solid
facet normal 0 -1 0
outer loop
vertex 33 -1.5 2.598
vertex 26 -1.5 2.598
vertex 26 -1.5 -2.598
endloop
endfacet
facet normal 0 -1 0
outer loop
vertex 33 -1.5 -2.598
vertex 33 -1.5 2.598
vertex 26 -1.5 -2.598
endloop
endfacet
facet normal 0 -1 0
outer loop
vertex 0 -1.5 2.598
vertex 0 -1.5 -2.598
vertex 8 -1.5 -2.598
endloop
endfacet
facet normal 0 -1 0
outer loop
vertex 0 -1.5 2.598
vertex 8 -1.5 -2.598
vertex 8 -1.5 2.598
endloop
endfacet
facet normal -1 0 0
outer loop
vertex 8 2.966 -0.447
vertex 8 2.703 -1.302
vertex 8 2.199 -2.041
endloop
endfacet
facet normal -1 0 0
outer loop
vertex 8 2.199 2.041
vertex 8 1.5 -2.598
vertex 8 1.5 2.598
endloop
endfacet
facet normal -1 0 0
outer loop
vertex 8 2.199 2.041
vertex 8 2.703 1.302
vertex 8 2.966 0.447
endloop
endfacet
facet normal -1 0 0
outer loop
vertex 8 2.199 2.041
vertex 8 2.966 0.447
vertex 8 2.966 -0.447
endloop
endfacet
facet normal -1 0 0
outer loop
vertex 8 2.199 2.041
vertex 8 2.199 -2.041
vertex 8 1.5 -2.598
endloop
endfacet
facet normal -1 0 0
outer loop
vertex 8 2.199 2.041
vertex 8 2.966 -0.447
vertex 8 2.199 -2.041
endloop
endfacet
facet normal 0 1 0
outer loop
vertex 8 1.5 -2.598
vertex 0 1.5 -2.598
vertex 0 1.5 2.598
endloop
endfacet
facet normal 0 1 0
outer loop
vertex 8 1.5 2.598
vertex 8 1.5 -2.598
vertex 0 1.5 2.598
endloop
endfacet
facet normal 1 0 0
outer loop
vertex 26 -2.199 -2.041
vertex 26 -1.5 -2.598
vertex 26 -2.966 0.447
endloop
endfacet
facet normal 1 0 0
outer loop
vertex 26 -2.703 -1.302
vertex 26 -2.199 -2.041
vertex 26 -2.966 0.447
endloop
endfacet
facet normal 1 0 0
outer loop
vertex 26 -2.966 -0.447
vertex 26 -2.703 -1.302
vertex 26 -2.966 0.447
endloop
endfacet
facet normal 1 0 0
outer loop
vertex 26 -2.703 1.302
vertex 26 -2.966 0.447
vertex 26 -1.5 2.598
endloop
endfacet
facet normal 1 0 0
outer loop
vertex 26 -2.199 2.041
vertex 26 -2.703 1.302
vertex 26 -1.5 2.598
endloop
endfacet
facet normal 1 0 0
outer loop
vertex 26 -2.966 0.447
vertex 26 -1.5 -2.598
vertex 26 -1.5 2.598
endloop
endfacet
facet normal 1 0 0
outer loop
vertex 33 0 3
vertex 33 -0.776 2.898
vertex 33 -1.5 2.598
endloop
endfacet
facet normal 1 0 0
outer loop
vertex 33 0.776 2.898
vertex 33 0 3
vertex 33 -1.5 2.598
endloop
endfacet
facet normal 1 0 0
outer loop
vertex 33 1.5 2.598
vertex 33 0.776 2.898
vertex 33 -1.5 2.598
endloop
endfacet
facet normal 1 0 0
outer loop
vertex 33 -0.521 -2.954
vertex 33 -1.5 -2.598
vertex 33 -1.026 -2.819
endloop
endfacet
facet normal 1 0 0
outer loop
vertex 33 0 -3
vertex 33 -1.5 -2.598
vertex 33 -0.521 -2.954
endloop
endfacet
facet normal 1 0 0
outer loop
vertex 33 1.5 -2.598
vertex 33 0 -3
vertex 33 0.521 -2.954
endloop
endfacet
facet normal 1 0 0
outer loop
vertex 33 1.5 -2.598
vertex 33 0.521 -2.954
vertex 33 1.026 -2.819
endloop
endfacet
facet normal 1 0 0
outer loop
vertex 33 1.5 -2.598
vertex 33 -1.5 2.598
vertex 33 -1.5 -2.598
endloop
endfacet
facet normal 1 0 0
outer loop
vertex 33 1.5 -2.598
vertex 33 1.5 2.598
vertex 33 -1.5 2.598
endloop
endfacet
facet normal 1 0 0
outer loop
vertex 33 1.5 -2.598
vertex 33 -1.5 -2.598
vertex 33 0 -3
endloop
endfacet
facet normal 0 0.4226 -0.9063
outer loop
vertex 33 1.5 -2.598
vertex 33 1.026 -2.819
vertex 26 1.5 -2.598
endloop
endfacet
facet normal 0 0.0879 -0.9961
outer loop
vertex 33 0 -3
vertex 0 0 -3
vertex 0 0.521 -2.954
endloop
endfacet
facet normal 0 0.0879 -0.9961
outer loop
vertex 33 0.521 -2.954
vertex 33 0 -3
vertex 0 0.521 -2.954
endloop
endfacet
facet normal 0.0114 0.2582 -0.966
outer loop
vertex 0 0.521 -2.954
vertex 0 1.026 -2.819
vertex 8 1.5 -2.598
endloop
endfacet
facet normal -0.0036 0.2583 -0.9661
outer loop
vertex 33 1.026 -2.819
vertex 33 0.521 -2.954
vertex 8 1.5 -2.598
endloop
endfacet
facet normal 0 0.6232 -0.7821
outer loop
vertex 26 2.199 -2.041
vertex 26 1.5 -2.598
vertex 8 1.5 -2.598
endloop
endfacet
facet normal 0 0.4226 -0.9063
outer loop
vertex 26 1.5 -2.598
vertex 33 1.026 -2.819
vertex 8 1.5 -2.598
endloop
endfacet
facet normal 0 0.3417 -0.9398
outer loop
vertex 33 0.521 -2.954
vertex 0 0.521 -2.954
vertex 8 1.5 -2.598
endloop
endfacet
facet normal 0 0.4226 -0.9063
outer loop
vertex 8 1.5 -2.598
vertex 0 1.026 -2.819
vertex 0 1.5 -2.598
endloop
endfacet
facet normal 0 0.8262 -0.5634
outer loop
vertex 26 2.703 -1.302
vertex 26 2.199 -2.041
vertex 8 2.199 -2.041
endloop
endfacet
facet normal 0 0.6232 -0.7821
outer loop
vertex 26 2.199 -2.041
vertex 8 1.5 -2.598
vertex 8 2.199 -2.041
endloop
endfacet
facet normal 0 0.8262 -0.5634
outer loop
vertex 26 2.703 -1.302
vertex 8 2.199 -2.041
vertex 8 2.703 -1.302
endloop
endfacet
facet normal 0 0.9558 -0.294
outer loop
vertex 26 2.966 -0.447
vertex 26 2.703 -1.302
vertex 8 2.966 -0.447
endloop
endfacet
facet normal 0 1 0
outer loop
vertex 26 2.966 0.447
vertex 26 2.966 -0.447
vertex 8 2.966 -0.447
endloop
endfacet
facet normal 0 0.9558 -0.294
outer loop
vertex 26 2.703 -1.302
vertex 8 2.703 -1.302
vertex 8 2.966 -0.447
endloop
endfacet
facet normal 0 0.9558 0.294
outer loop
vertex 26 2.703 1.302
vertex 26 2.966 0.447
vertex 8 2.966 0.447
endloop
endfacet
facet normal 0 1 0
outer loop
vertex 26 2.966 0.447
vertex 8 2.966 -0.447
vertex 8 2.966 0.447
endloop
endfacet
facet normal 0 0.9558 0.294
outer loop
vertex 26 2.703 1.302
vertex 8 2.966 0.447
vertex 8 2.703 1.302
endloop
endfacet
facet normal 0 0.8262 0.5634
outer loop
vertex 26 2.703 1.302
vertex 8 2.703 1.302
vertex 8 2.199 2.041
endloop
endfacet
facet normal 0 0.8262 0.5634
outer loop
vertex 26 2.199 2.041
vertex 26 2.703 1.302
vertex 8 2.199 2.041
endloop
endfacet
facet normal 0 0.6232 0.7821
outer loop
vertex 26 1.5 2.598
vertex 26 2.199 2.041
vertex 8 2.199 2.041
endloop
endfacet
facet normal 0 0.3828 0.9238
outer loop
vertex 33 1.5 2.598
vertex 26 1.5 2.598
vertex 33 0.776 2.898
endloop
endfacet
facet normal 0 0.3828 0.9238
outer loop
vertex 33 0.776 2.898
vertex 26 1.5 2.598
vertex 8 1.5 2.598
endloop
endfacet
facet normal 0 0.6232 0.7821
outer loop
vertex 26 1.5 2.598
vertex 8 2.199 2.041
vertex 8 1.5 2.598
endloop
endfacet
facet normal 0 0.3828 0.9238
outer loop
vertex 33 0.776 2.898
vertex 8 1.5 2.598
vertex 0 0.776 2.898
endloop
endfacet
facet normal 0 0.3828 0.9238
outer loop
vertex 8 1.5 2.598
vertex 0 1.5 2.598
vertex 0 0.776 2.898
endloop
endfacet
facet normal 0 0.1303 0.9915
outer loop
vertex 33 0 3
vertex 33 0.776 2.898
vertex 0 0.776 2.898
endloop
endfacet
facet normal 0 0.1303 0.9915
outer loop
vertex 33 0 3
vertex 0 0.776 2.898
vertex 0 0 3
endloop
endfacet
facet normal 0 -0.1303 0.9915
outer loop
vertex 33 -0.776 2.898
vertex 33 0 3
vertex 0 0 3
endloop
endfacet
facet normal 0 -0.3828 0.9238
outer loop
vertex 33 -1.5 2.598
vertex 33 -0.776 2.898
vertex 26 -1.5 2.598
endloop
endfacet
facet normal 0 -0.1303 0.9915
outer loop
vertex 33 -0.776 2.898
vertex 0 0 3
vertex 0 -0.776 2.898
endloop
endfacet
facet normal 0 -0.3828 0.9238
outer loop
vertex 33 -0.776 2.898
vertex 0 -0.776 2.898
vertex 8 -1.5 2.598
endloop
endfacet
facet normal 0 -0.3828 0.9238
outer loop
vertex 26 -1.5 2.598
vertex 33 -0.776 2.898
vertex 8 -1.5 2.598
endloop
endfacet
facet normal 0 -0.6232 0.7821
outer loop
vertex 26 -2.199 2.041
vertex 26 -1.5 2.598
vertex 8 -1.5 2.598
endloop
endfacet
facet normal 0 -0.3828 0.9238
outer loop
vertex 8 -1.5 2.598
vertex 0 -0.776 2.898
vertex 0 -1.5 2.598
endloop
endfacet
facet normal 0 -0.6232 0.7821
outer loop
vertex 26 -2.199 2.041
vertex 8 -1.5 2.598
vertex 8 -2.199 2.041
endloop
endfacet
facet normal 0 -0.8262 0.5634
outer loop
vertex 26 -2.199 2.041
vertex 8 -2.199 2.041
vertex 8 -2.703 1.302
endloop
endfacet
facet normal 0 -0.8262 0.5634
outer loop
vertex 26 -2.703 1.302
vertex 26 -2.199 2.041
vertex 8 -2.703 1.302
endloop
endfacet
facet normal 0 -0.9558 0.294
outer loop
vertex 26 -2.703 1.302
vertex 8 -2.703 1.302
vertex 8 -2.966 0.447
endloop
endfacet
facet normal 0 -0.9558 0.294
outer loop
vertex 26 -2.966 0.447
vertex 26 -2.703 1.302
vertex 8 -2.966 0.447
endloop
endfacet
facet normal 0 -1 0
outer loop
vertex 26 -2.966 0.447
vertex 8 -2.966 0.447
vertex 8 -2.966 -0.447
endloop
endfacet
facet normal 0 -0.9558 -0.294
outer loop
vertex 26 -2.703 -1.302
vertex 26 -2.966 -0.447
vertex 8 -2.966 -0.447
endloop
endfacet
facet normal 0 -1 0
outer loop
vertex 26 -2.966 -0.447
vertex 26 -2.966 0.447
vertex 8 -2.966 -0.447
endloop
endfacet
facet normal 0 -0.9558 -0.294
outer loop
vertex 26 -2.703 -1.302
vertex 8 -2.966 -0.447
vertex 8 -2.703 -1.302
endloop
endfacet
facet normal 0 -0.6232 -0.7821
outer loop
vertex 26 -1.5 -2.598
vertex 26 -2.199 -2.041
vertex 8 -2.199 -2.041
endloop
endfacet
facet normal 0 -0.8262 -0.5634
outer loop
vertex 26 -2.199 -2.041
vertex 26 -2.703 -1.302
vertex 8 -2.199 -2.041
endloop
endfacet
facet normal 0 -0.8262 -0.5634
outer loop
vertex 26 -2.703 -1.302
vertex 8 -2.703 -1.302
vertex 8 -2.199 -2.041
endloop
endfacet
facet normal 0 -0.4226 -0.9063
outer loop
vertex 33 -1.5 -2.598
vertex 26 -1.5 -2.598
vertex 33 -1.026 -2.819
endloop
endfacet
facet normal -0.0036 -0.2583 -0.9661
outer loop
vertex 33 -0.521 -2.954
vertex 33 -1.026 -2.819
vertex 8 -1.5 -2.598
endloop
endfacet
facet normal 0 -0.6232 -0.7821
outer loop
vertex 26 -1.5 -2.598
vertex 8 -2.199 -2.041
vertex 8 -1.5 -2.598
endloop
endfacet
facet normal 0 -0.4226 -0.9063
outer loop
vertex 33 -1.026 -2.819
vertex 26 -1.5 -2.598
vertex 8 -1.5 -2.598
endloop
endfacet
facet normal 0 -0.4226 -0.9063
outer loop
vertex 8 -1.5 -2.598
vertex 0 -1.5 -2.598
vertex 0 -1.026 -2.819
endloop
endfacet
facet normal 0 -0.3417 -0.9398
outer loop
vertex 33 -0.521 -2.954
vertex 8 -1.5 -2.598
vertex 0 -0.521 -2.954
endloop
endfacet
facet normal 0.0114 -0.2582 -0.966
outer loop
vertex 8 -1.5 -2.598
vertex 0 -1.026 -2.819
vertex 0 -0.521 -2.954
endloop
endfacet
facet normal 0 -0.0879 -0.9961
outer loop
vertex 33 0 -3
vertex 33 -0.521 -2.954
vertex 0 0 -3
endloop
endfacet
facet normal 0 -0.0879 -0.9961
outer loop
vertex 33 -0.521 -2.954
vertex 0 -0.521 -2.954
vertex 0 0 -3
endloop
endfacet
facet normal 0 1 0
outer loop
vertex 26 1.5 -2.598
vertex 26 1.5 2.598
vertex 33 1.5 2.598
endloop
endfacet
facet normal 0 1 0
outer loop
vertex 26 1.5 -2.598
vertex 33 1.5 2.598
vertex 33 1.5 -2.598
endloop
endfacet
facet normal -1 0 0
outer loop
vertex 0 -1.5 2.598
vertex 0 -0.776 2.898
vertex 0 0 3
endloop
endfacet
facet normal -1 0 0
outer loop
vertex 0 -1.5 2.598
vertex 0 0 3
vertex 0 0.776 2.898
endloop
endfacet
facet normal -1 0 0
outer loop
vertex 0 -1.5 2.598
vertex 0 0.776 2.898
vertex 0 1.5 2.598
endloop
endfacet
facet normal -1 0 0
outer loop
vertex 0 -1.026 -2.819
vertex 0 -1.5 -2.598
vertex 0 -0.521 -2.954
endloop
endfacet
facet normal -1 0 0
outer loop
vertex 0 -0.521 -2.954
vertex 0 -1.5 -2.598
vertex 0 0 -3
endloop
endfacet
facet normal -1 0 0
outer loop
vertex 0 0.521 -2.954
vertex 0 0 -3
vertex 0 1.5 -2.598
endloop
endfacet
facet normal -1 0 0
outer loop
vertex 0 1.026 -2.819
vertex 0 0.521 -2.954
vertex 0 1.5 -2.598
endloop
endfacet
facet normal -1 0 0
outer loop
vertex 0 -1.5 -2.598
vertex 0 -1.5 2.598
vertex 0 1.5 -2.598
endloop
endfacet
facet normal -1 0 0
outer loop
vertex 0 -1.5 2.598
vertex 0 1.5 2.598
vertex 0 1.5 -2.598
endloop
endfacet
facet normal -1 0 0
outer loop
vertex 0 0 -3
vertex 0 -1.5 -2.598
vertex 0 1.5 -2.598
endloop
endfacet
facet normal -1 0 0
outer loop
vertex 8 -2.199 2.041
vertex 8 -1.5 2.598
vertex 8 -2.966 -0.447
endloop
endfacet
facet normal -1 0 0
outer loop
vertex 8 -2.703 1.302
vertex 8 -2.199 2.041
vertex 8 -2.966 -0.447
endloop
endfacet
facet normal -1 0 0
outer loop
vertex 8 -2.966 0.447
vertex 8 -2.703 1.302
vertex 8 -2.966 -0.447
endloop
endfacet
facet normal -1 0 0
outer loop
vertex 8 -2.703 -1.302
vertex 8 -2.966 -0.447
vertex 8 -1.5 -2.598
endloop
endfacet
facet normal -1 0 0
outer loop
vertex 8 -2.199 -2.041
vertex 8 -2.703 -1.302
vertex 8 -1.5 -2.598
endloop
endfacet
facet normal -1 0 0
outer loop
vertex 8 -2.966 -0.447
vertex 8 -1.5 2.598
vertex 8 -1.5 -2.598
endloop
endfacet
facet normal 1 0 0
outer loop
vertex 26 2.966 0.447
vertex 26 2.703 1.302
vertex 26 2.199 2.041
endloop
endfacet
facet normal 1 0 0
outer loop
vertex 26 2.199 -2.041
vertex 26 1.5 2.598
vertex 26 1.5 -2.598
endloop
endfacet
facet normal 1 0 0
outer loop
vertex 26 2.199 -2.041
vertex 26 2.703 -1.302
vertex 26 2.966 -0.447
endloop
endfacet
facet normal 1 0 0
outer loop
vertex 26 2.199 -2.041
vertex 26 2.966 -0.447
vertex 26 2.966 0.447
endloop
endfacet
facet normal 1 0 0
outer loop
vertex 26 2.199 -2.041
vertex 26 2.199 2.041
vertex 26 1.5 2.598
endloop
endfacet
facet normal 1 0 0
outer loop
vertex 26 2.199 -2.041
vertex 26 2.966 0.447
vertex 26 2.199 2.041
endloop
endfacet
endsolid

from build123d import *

# Parameters (mm, degrees)
SKETCH1_R           = 3
BOSS_EXTRUDE1_DEPTH = 33
CUT_EXTRUDE1_DEPTH  = 8
CUT_EXTRUDE2_START  = -7
CUT_EXTRUDE2_DEPTH  = 7


with BuildPart() as part:
    # Sketch1 → Boss-Extrude1 (new body)
    with BuildSketch(Plane(origin=(0, 0, 0), x_dir=(0, 0, -1), z_dir=(1, 0, 0))):
        Circle(SKETCH1_R)
    extrude(amount=BOSS_EXTRUDE1_DEPTH)

    # Sketch2 → Cut-Extrude1 (cut)
    with BuildSketch(Plane.ZY):
        with BuildLine():
            Line((-2.598076211, 1.5), (2.598076211, 1.5))
            ThreePointArc((2.598076211, 1.5), (0, 3), (-2.598076211, 1.5))
        make_face()
        with BuildLine():
            Line((-2.598076211, -1.5), (2.598076211, -1.5))
            ThreePointArc((2.598076211, -1.5), (0, -3), (-2.598076211, -1.5))
        make_face()
    extrude(amount=-CUT_EXTRUDE1_DEPTH, mode=Mode.SUBTRACT)

    # Sketch3 → Cut-Extrude2 (cut)
    with BuildSketch(Plane(origin=(33, 0, 0), x_dir=(0, 0, -1), z_dir=(1, 0, 0)).offset(CUT_EXTRUDE2_START)):
        with BuildLine():
            Line((-2.598076211, 1.5), (2.598076211, 1.5))
            ThreePointArc((2.598076211, 1.5), (0, 3), (-2.598076211, 1.5))
        make_face()
        with BuildLine():
            Line((-2.598076211, -1.5), (2.598076211, -1.5))
            ThreePointArc((2.598076211, -1.5), (0, -3), (-2.598076211, -1.5))
        make_face()
    extrude(amount=CUT_EXTRUDE2_DEPTH, mode=Mode.SUBTRACT)


solid = part.part
